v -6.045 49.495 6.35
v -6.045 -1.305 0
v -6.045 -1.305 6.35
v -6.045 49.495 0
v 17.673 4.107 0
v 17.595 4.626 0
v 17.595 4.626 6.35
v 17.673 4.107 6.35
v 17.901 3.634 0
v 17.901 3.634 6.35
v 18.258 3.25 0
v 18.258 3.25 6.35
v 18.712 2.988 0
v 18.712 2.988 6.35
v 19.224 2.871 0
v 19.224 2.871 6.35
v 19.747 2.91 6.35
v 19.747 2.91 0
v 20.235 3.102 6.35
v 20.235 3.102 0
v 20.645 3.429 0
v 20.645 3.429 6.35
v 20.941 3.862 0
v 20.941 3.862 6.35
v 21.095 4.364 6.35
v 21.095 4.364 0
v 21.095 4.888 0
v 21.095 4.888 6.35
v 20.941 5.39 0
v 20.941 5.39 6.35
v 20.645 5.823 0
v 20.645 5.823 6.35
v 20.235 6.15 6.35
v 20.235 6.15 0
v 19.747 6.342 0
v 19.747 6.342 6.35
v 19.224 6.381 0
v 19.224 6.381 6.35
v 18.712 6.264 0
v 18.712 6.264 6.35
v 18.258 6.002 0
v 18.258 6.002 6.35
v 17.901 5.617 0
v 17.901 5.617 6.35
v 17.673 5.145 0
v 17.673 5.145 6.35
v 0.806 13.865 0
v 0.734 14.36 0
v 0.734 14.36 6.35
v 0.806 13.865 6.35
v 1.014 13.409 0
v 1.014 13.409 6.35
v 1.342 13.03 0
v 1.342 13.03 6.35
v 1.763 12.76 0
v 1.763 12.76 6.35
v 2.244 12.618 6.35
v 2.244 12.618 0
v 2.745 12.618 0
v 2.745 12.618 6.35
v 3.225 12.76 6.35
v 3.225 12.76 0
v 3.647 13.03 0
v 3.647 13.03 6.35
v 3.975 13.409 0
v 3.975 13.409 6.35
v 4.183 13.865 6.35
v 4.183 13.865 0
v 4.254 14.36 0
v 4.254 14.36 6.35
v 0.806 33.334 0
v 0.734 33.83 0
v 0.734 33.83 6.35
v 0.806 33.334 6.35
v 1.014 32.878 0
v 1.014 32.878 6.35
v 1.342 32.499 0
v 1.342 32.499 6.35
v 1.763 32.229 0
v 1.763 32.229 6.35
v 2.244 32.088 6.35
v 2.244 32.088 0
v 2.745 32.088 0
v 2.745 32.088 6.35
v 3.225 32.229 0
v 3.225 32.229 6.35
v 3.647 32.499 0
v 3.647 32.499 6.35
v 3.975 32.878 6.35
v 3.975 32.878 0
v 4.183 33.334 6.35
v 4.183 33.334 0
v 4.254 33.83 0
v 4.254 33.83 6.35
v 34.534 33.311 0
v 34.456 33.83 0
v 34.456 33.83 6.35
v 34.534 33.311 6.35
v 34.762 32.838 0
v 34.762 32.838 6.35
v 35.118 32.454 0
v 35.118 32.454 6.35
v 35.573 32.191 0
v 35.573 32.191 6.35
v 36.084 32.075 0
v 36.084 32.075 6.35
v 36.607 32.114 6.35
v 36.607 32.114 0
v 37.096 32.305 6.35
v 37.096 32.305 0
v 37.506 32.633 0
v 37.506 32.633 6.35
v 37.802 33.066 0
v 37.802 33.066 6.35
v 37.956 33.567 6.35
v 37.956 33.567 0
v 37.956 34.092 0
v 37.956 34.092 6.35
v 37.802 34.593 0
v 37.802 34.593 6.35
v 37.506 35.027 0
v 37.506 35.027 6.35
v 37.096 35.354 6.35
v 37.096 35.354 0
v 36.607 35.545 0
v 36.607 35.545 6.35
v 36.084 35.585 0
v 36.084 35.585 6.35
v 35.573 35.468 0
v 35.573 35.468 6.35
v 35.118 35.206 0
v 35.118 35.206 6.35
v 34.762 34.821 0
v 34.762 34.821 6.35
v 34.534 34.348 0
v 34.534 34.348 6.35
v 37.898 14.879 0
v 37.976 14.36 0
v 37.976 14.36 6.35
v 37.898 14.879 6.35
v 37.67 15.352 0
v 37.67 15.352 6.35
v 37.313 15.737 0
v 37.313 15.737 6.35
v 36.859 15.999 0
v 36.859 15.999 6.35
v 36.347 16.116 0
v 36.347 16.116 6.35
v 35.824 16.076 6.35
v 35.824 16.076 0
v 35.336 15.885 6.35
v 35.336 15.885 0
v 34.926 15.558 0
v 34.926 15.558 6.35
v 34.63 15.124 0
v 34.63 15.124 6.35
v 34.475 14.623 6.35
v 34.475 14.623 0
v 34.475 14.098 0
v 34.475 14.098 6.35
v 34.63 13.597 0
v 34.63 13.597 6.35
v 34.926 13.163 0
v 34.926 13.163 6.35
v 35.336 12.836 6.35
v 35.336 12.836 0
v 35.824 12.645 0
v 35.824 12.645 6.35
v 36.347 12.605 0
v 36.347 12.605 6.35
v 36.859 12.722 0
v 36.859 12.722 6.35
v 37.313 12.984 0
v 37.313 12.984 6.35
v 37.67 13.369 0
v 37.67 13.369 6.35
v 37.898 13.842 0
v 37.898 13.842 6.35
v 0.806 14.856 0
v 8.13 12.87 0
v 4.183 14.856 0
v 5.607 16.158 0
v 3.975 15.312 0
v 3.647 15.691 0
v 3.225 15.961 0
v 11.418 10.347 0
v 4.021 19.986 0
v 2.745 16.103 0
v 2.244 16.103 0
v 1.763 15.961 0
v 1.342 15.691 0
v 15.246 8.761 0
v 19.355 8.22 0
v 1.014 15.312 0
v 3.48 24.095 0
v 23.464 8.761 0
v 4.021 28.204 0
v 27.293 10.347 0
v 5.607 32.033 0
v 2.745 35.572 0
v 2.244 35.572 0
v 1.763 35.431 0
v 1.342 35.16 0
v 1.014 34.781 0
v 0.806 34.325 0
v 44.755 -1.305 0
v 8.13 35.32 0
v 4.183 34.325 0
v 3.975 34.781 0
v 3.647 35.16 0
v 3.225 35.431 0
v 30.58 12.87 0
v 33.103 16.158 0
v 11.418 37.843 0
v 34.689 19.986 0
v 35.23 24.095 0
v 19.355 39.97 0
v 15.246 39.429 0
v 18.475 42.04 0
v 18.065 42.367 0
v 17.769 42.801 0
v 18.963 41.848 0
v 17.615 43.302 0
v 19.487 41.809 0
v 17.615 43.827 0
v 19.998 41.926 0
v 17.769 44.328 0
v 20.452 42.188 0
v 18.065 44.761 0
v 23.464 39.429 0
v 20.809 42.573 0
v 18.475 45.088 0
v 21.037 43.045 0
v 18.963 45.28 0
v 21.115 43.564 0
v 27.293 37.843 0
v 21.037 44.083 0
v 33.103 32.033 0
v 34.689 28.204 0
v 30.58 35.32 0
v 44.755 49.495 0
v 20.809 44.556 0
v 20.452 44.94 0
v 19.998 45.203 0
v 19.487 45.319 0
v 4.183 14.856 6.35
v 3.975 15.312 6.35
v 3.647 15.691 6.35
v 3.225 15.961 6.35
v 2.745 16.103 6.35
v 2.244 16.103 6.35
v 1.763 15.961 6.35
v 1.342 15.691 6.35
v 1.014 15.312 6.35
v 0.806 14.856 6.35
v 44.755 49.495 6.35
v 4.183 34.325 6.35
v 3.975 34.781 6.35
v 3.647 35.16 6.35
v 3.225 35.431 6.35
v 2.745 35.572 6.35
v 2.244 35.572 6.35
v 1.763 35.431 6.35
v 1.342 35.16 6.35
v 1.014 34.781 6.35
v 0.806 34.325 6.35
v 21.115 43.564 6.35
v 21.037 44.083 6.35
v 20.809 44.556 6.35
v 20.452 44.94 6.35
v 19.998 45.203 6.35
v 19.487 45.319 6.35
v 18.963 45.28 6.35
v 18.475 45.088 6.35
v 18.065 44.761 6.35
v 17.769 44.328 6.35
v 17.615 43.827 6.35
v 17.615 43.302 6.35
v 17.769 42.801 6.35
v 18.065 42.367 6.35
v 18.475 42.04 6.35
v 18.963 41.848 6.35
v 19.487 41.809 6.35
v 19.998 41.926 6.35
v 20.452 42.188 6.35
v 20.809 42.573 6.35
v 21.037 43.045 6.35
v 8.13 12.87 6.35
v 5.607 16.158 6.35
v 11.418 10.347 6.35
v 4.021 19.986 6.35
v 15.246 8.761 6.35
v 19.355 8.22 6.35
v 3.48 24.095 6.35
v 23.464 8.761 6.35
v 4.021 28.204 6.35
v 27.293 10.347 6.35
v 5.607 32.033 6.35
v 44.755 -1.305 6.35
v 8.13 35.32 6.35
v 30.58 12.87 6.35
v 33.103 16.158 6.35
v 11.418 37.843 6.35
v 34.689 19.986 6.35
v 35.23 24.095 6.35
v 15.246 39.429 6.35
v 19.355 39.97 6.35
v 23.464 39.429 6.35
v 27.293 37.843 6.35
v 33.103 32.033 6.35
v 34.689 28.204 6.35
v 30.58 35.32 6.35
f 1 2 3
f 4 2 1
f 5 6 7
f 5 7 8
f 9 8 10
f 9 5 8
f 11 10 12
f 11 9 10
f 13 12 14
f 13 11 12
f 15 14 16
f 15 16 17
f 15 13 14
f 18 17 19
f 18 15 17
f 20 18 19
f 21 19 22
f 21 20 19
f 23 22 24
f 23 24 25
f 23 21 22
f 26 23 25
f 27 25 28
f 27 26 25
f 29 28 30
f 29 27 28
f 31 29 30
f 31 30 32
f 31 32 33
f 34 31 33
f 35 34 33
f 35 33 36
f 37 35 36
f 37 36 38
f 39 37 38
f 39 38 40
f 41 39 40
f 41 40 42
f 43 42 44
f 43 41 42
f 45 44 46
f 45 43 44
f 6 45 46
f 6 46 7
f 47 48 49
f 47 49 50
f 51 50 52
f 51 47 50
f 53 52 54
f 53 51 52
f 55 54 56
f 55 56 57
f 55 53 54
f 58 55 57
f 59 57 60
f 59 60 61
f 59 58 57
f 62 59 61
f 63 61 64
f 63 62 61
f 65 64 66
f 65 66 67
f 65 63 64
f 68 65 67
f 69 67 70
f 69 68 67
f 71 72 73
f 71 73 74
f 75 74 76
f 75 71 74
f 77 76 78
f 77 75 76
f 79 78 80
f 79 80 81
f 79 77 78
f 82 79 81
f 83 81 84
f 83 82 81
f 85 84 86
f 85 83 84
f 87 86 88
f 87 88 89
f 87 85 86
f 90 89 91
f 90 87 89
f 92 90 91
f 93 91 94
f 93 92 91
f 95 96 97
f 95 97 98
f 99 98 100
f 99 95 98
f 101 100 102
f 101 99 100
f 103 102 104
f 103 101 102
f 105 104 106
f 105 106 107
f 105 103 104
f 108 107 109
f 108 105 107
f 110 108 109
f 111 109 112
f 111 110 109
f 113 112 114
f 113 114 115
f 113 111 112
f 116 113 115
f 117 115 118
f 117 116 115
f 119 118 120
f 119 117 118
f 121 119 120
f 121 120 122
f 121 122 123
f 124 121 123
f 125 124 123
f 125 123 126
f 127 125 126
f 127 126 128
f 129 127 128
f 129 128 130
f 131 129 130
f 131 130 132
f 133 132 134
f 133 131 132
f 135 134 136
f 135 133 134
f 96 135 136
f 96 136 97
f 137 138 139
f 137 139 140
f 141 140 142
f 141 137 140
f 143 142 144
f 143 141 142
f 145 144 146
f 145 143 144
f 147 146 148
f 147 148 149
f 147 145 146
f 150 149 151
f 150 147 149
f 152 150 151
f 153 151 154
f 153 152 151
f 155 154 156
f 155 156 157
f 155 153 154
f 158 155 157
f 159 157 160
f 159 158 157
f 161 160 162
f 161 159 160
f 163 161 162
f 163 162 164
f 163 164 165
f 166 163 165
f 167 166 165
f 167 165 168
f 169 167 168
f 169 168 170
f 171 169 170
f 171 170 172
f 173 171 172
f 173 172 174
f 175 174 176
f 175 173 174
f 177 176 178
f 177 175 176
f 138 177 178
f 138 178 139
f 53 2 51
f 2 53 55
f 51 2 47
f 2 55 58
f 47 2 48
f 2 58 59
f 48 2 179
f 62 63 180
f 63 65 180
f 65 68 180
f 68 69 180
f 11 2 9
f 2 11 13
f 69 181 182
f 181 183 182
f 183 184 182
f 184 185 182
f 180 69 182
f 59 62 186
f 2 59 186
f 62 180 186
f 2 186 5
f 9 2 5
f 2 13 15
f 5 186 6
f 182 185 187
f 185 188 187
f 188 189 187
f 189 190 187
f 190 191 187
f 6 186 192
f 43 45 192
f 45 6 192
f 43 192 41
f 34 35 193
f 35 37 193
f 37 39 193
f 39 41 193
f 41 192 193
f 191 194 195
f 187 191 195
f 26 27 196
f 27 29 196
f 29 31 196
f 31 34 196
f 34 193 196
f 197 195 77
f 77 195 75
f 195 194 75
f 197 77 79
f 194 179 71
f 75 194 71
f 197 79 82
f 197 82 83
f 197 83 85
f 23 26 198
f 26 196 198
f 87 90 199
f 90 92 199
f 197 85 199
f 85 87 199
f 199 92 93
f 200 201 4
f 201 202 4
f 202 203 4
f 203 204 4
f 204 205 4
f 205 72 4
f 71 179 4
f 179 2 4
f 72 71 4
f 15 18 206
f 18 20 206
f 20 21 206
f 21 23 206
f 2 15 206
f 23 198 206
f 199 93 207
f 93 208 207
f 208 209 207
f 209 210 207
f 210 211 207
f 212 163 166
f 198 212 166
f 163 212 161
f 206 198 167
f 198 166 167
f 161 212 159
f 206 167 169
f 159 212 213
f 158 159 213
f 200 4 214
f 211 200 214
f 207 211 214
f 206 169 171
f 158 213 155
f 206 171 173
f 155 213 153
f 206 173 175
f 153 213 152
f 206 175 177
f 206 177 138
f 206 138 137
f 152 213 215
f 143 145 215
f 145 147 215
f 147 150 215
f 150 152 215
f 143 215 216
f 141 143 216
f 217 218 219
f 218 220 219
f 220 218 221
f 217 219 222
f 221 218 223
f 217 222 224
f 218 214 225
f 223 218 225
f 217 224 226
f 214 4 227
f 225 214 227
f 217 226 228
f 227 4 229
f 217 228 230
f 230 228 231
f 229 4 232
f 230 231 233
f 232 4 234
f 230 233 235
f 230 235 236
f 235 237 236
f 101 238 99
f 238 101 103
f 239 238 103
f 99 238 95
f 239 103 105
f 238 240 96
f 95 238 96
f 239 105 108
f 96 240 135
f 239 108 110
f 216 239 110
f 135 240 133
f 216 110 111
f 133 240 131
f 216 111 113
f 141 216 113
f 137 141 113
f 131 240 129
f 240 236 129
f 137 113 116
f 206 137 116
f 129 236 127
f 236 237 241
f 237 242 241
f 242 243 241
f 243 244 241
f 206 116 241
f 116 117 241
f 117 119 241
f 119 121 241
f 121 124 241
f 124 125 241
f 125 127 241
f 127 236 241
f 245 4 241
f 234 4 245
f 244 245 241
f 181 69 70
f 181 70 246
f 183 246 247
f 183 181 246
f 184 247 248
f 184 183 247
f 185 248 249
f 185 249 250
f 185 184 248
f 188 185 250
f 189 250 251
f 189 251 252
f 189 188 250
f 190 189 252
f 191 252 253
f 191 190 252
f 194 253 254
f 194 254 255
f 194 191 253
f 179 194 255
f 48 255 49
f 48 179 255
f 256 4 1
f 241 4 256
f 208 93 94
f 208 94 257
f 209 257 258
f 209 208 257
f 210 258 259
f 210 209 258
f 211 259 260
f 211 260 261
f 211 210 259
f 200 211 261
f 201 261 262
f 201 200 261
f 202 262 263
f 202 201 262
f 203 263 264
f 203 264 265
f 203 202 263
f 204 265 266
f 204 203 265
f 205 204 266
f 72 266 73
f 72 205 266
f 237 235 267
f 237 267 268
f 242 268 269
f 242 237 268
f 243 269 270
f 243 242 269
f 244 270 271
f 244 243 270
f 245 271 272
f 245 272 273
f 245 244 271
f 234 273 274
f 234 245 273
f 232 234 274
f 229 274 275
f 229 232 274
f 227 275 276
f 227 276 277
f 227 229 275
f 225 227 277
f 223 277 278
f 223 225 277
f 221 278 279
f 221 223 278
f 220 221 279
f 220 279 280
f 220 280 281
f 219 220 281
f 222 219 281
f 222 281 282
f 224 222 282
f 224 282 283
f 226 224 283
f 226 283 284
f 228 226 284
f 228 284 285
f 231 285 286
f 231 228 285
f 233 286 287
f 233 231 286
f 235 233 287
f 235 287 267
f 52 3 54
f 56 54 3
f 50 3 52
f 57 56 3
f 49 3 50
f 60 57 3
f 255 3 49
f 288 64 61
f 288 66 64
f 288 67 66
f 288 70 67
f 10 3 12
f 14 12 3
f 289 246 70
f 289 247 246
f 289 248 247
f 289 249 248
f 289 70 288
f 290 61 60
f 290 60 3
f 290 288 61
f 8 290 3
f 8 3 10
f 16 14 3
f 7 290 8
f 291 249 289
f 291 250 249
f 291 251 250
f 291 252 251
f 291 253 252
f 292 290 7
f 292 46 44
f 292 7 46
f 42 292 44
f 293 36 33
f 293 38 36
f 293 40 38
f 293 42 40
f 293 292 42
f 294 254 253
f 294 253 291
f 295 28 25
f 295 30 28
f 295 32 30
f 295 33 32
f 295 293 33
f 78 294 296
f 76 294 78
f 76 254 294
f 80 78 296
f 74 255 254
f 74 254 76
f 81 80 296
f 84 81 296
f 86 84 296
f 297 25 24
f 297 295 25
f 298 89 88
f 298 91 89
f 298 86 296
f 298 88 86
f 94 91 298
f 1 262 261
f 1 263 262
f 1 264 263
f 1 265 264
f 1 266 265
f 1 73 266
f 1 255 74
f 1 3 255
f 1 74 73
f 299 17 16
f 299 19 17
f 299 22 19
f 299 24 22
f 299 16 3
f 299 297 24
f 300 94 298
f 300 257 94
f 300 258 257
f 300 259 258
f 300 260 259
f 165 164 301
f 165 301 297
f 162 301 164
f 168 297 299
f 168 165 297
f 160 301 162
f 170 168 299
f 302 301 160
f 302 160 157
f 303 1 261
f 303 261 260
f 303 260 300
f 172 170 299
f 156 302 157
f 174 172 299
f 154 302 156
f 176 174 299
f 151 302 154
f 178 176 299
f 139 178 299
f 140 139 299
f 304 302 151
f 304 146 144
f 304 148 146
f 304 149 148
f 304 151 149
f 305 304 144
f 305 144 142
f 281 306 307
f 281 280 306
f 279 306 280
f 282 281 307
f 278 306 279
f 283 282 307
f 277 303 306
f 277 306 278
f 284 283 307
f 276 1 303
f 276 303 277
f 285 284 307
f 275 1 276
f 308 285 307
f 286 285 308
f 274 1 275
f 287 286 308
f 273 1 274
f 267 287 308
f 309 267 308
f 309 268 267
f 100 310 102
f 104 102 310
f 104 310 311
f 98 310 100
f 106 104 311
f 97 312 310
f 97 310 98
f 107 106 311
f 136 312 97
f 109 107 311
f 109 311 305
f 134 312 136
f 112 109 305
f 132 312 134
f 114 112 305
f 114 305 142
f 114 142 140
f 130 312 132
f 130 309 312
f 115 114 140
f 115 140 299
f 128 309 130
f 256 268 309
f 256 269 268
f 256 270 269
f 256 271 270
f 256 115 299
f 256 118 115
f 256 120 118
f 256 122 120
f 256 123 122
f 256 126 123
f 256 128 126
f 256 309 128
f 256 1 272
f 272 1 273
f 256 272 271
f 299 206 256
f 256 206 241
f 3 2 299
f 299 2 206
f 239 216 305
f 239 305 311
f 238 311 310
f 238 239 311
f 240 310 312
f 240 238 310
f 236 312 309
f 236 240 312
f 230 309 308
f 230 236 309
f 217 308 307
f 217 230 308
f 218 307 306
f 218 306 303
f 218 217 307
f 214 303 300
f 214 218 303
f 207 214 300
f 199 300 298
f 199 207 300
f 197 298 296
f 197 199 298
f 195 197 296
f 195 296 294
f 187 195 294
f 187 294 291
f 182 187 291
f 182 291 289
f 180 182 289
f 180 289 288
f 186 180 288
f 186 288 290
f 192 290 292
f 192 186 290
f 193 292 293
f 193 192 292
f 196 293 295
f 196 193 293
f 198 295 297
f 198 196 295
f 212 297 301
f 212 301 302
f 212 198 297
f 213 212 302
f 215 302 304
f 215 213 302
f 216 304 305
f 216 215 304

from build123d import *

# Parameters (mm, degrees)
SKETCH1_W           = 50.8
SKETCH1_H           = 50.8
SKETCH1_R           = 15.875
BOSS_EXTRUDE1_DEPTH = 6.35


with BuildPart() as part:
    # Sketch1 → Boss-Extrude1 (new body)
    with BuildSketch(Plane.XY):
        with Locations((19.355037388, 24.095046544)):
            Rectangle(SKETCH1_W, SKETCH1_H)
        with Locations((19.355037388, 24.095046544)):
            Circle(SKETCH1_R, mode=Mode.SUBTRACT)
        with BuildLine():
            ThreePointArc((34.45579594, 14.360477203), (36.215806077, 12.600467066), (37.975816214, 14.360477203))
            ThreePointArc((37.975816214, 14.360477203), (36.215806077, 16.12048734), (34.45579594, 14.360477203))
        make_face(mode=Mode.SUBTRACT)
        with BuildLine():
            ThreePointArc((21.115047525, 4.625907862), (19.355037388, 6.385917999), (17.595027251, 4.625907862))
            ThreePointArc((17.595027251, 4.625907862), (19.355037388, 2.865897725), (21.115047525, 4.625907862))
        make_face(mode=Mode.SUBTRACT)
        with BuildLine():
            ThreePointArc((17.595027251, 43.564185227), (19.355037388, 41.80417509), (21.115047525, 43.564185227))
            ThreePointArc((21.115047525, 43.564185227), (19.355037388, 45.324195364), (17.595027251, 43.564185227))
        make_face(mode=Mode.SUBTRACT)
        with BuildLine():
            ThreePointArc((37.975816214, 33.829615886), (36.215806077, 35.589626023), (34.45579594, 33.829615886))
            ThreePointArc((34.45579594, 33.829615886), (36.215806077, 32.069605749), (37.975816214, 33.829615886))
        make_face(mode=Mode.SUBTRACT)
        with BuildLine():
            ThreePointArc((0.734258563, 33.829615886), (2.494268699, 32.069605749), (4.254278836, 33.829615886))
            ThreePointArc((4.254278836, 33.829615886), (2.494268699, 35.589626023), (0.734258563, 33.829615886))
        make_face(mode=Mode.SUBTRACT)
        with BuildLine():
            ThreePointArc((4.254278836, 14.360477203), (2.494268699, 16.12048734), (0.734258563, 14.360477203))
            ThreePointArc((0.734258563, 14.360477203), (2.494268699, 12.600467066), (4.254278836, 14.360477203))
        make_face(mode=Mode.SUBTRACT)
    extrude(amount=BOSS_EXTRUDE1_DEPTH)


solid = part.part
